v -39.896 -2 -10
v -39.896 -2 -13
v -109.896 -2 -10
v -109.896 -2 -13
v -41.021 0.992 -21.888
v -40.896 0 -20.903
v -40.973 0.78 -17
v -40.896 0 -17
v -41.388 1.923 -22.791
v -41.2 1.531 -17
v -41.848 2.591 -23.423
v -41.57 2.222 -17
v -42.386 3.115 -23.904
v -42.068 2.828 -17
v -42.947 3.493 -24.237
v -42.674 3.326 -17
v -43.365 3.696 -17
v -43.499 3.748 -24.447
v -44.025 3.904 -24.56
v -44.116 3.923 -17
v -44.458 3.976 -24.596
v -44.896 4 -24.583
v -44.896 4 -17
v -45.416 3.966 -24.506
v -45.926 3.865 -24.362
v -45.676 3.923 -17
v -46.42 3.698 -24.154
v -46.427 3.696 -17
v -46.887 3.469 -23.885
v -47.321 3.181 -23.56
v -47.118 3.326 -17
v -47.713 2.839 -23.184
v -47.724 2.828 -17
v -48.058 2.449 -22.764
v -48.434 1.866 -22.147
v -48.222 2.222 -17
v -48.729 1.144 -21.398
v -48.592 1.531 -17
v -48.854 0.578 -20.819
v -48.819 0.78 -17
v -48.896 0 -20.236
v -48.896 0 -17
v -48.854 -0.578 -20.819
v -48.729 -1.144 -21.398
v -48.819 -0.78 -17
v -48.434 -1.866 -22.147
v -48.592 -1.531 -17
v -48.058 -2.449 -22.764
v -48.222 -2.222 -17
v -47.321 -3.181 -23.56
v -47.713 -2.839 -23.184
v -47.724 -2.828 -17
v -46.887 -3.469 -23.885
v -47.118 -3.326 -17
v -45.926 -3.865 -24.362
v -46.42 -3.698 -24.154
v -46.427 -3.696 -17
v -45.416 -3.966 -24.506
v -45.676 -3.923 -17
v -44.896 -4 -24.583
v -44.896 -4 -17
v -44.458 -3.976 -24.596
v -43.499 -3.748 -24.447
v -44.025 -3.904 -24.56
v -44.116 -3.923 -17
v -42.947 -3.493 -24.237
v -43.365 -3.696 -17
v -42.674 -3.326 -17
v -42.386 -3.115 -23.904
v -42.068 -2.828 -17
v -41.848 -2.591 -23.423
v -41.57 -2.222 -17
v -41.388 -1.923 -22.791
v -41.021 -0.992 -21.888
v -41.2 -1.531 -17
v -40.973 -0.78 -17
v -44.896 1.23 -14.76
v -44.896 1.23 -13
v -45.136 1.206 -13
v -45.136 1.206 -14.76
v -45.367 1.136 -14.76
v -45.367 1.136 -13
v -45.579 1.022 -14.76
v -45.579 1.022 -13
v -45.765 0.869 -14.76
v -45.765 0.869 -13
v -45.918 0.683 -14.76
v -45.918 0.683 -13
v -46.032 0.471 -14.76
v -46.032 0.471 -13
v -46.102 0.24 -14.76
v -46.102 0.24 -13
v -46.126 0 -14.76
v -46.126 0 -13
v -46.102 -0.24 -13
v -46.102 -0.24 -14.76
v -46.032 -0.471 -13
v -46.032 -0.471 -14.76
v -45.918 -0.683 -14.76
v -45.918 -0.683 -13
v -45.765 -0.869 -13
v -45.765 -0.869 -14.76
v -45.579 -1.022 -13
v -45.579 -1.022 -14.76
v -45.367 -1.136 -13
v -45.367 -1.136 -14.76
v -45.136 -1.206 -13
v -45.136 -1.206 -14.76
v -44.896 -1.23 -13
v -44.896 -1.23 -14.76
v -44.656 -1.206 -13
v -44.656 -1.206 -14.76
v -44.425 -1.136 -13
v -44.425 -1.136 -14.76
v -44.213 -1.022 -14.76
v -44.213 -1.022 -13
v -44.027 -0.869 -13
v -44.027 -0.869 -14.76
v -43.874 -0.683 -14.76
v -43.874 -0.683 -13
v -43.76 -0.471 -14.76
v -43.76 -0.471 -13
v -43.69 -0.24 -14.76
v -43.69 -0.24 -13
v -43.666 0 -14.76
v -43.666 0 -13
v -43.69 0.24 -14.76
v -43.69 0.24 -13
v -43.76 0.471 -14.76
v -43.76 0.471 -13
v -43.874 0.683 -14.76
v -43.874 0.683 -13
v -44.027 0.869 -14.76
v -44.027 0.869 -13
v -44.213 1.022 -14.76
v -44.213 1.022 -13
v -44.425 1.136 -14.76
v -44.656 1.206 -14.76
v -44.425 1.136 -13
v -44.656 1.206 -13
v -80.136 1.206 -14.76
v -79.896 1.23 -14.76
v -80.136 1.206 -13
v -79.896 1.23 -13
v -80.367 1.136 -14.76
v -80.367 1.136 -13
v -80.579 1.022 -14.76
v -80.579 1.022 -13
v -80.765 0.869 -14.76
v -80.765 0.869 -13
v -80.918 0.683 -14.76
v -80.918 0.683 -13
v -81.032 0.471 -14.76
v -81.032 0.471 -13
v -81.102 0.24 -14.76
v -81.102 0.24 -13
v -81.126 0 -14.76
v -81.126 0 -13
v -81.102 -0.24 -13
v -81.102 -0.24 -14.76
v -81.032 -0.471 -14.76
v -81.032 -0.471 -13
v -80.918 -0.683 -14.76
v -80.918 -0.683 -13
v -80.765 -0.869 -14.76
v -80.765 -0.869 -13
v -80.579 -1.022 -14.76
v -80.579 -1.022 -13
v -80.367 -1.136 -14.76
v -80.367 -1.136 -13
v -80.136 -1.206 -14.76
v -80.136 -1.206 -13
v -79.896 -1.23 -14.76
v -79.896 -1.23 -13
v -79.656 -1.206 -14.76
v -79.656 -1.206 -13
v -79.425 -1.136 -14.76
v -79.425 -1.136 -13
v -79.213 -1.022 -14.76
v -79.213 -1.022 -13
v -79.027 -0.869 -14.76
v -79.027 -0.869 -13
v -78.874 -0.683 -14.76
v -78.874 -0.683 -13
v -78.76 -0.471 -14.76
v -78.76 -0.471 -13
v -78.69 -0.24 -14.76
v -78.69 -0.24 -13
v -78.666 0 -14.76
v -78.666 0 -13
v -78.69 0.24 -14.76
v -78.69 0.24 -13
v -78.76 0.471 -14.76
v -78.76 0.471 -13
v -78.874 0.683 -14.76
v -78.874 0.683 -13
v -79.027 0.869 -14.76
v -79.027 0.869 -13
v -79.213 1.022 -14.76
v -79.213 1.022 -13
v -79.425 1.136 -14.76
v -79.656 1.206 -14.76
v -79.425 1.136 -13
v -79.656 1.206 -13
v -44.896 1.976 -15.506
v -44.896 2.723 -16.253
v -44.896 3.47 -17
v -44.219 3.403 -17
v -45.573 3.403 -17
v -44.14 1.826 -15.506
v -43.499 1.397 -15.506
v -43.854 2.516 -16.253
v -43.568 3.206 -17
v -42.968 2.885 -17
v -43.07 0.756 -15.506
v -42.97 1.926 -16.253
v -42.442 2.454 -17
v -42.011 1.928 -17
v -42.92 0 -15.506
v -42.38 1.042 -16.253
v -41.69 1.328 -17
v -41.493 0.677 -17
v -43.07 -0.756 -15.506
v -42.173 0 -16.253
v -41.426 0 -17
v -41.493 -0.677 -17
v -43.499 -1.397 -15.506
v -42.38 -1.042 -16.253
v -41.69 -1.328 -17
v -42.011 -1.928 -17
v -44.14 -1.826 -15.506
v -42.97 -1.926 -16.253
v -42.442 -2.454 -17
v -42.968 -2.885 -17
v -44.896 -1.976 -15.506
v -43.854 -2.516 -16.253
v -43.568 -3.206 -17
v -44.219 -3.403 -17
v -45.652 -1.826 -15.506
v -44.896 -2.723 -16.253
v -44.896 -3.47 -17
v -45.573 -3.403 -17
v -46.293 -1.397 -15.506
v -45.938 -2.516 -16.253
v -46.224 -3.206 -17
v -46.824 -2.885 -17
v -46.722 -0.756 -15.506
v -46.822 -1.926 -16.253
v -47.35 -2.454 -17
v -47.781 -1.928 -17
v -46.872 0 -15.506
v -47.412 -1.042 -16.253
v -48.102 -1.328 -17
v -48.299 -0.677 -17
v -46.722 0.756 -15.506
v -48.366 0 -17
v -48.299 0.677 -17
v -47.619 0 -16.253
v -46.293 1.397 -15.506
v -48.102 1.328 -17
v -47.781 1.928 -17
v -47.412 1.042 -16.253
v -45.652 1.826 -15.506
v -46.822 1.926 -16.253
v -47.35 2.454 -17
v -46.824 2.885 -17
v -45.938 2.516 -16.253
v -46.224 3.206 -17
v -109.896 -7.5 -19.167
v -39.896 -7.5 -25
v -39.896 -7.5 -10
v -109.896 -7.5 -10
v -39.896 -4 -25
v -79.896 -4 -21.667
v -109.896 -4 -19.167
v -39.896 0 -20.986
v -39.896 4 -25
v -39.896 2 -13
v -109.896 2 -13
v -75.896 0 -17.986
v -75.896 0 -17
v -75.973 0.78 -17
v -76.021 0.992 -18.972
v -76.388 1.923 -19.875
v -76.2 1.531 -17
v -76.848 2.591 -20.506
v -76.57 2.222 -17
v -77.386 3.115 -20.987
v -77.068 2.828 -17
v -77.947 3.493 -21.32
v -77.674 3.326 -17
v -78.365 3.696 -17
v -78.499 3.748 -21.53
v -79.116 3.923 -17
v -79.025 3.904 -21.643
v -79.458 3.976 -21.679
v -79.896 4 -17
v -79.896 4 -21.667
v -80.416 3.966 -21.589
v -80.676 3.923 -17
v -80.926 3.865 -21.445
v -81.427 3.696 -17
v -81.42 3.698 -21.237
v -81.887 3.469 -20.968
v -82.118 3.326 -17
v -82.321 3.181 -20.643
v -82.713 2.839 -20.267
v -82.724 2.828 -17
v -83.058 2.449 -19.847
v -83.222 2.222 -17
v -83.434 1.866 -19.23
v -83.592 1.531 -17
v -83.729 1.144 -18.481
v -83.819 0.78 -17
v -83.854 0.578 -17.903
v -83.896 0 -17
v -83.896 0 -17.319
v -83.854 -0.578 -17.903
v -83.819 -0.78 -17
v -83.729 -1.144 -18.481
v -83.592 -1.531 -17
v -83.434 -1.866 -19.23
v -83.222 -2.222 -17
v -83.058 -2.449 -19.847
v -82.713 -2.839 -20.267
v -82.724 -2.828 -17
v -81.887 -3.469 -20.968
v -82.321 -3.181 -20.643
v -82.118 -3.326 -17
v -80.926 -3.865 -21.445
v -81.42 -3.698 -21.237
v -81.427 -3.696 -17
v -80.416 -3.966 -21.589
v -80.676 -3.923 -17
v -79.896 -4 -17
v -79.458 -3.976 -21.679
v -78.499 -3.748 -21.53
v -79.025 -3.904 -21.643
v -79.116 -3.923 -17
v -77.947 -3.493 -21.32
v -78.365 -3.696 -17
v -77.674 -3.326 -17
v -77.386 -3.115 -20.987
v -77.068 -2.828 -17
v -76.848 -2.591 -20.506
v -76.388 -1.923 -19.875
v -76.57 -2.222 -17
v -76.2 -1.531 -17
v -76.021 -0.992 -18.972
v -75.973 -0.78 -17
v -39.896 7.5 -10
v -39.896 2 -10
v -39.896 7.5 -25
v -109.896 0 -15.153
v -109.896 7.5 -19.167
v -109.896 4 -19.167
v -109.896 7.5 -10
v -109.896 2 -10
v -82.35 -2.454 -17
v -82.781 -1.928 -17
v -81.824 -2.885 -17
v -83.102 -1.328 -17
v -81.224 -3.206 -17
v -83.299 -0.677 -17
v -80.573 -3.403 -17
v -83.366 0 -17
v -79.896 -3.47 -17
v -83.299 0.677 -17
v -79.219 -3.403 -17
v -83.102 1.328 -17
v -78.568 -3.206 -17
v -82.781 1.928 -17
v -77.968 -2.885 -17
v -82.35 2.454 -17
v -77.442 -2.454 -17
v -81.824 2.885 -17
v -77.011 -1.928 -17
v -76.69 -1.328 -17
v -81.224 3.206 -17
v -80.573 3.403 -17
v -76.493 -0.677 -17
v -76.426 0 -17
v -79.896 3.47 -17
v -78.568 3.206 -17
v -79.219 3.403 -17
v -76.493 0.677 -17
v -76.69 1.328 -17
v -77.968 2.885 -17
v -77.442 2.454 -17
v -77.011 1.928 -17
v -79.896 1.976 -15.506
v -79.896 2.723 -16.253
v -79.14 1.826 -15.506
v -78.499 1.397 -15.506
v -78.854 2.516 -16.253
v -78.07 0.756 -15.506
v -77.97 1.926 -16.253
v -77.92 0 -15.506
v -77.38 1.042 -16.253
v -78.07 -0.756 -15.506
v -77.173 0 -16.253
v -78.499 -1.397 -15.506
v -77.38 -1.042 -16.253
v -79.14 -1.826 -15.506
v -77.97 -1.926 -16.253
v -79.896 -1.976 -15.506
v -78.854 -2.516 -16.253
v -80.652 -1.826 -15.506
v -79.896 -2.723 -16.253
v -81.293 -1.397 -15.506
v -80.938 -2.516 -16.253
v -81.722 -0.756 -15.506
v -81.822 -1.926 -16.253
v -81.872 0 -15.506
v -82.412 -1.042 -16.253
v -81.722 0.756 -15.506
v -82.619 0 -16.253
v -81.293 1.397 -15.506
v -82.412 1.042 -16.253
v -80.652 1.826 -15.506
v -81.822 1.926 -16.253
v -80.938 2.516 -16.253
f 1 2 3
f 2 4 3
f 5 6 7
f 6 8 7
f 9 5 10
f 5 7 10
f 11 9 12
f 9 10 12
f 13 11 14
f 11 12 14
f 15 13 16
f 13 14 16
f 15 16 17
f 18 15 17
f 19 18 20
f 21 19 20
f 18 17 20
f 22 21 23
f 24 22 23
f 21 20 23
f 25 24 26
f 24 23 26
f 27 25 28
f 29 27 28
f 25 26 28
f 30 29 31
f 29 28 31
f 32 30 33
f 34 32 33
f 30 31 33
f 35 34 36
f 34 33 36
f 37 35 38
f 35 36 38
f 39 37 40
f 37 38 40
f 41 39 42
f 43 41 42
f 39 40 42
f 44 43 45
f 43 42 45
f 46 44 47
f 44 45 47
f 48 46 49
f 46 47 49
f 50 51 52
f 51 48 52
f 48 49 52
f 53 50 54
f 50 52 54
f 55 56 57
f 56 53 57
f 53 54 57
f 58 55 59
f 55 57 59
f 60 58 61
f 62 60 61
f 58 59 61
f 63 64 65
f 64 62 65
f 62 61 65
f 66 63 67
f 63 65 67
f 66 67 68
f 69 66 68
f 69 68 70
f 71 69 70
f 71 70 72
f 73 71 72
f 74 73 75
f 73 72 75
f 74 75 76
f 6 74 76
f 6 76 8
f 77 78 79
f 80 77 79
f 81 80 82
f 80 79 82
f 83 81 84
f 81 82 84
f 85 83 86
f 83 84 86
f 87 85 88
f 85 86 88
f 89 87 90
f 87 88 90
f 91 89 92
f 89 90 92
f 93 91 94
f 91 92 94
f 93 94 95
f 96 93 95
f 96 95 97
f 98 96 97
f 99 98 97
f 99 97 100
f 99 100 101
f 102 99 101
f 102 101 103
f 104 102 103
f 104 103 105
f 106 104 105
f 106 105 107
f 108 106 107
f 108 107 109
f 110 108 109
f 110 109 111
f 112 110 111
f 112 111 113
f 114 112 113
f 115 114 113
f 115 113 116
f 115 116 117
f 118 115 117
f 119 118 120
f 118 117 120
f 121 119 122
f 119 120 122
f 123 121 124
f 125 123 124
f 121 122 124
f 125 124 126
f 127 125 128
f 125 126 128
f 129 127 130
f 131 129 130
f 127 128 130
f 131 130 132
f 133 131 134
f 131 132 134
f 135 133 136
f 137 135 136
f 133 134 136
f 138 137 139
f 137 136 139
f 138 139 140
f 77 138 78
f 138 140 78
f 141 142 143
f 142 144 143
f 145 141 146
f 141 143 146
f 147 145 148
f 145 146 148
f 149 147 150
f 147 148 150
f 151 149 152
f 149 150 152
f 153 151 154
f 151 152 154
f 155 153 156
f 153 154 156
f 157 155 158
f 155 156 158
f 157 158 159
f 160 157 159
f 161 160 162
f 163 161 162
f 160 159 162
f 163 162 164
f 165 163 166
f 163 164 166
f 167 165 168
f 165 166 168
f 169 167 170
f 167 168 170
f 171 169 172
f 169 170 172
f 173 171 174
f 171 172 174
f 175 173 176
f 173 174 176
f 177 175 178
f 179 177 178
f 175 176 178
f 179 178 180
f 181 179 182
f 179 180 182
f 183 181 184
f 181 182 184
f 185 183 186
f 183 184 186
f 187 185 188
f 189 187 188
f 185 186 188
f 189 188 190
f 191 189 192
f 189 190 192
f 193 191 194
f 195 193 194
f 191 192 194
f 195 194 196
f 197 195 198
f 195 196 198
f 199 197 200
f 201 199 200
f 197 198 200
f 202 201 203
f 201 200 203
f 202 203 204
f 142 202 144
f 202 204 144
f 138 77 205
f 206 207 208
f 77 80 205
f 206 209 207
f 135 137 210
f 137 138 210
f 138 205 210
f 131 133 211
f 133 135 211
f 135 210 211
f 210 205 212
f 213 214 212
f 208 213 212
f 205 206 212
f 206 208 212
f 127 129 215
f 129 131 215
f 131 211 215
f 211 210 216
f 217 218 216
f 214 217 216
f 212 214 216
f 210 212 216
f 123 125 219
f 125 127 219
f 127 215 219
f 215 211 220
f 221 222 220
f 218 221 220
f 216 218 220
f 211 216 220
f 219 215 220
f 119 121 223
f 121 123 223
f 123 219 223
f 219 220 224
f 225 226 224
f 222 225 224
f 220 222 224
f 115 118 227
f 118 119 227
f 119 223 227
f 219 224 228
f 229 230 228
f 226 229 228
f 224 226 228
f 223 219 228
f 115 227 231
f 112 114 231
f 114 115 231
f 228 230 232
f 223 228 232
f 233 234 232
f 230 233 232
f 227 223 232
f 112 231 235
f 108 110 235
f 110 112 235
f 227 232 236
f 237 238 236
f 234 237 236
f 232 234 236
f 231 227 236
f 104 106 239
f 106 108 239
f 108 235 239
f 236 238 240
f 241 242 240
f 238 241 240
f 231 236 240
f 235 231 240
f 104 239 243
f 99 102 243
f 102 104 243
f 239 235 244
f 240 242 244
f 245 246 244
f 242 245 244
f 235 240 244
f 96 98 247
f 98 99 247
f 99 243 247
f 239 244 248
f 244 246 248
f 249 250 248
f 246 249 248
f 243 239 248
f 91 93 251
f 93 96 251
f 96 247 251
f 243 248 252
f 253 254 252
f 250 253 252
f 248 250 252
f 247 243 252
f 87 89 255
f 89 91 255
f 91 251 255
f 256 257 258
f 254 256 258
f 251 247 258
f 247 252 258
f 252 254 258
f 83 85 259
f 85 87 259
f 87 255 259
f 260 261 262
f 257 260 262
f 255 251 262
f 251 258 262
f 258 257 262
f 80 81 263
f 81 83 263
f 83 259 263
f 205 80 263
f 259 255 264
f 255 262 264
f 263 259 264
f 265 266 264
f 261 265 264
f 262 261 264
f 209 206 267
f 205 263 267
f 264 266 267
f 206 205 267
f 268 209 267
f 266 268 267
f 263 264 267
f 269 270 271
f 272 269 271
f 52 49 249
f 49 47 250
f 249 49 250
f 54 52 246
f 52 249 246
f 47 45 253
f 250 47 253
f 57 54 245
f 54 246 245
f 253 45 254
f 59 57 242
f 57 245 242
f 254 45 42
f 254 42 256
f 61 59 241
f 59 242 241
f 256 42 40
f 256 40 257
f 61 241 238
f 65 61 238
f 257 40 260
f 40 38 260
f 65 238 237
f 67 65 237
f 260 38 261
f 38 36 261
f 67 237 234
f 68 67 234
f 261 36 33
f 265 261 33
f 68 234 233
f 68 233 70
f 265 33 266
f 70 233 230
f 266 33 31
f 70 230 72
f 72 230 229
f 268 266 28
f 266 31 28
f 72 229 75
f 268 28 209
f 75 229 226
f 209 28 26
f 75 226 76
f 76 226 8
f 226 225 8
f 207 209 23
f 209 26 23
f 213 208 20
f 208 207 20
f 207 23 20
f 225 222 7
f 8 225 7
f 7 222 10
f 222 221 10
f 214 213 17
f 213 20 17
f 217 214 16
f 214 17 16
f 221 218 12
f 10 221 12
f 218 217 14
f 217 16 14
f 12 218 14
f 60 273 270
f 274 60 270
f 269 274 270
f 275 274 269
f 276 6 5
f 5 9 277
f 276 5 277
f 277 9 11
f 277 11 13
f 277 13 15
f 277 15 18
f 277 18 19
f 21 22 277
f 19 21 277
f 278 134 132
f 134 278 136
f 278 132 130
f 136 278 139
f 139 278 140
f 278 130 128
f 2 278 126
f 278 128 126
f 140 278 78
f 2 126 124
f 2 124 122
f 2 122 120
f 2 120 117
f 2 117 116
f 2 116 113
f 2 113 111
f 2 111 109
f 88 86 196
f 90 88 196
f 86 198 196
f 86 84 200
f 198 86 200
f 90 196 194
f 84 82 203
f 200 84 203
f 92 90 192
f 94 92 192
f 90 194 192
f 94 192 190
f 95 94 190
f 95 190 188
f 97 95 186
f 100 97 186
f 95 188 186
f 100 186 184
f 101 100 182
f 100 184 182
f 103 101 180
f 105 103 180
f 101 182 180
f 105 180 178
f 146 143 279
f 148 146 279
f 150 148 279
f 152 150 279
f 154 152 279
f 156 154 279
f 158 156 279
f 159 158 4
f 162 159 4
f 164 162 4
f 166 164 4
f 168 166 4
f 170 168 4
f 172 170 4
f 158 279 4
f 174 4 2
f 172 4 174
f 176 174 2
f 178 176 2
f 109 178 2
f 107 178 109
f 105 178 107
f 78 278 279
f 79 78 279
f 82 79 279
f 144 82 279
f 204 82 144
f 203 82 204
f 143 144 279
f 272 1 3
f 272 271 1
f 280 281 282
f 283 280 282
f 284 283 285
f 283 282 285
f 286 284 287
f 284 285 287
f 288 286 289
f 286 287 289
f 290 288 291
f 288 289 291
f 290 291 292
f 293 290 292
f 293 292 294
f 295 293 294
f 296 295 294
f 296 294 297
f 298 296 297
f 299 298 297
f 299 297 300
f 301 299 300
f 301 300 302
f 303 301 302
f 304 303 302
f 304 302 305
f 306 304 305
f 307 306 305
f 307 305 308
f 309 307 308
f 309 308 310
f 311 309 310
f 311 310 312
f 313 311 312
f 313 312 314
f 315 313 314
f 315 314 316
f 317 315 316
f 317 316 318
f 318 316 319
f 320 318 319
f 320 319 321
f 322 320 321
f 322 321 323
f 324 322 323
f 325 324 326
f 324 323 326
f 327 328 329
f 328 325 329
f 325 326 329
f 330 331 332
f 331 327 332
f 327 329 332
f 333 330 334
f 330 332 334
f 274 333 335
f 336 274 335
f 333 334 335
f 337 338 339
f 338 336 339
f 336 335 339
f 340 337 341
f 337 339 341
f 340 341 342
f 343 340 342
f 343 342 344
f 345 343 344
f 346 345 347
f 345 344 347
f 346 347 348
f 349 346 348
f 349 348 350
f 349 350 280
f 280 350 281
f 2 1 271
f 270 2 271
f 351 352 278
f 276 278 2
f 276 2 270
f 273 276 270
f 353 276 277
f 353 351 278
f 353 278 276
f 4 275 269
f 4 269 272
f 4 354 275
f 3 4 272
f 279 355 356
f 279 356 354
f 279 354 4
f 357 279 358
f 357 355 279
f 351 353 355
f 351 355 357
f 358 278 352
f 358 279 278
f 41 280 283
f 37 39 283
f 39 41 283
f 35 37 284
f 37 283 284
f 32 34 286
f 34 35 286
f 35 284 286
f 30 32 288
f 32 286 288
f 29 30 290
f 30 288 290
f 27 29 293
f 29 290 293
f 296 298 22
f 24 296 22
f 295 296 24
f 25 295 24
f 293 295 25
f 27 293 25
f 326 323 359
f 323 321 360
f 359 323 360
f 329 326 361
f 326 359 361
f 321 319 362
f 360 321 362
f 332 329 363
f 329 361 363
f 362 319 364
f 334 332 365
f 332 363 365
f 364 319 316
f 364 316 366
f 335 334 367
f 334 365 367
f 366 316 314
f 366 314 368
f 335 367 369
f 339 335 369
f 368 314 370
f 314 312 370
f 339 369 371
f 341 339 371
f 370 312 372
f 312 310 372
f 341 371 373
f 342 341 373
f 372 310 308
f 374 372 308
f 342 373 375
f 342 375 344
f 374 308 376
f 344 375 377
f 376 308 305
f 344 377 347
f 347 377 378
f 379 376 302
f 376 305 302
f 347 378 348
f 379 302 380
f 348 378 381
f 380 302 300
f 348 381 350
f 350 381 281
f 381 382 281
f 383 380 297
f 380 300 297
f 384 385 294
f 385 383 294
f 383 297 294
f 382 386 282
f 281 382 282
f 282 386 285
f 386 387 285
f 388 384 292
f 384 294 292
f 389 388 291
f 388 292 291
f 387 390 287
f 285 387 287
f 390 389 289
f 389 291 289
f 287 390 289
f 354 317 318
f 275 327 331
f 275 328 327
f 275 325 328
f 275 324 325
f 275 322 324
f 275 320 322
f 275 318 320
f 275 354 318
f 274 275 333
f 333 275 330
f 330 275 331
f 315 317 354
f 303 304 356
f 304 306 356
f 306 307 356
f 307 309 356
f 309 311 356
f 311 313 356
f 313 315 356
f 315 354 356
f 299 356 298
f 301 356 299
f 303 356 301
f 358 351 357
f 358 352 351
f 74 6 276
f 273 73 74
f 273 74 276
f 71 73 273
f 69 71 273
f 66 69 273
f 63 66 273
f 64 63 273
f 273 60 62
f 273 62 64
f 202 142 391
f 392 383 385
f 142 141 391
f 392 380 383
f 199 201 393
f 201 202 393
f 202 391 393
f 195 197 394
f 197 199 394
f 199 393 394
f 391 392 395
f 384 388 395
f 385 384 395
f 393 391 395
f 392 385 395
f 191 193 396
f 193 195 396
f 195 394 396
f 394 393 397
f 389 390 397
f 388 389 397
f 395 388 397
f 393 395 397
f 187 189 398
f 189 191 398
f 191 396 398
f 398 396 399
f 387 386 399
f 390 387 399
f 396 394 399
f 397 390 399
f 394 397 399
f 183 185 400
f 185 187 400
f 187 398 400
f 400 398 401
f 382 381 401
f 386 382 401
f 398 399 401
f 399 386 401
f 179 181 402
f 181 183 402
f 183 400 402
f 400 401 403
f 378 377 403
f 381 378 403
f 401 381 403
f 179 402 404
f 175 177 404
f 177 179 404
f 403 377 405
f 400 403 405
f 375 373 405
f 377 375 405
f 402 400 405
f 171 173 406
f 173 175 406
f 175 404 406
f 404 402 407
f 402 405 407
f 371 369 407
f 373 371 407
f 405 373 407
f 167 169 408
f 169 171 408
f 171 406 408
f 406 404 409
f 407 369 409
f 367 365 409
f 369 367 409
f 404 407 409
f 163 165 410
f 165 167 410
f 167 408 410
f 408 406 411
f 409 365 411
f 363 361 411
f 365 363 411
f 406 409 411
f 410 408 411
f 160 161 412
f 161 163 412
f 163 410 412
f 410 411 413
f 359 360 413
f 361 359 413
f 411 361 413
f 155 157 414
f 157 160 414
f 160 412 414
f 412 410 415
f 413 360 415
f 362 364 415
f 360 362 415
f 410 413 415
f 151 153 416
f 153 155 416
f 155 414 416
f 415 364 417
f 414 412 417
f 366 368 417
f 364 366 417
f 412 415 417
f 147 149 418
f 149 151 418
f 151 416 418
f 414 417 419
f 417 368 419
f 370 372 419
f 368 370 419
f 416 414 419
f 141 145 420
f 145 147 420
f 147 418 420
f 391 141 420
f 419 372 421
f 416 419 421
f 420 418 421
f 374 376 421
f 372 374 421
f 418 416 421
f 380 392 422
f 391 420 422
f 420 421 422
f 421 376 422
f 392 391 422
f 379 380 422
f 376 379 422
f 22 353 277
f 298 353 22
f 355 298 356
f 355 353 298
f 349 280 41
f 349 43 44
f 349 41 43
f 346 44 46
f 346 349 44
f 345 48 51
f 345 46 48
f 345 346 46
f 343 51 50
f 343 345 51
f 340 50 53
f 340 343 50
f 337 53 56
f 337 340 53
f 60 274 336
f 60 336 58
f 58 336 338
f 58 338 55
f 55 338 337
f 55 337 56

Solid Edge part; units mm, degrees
sketch "Sketch1" plane through (0, 0, 0) normal (0, -1, 0) x (1, 0, 0)
  line L0 (-109.896, -8.7564) -> (-39.896, 10)
  line L1 (-39.896, 10) -> (30.104, 10)
  arc A0 (30.104, 10) -> (30.104, -10) centre (30.104, 0) cw
  line L2 (30.104, -10) -> (-39.896, -10)
  line L3 (-39.896, -10) -> (-39.896, -18.7564)
  line L4 (-39.896, -18.7564) -> (-109.896, -18.7564)
  line L5 (-109.896, -18.7564) -> (-109.896, -8.7564)
  circle A1 centre (30.104, 0) radius 5
  circle A2 centre (0, 0) radius 5
  dimension "D1" = 10
  dimension "D2" = 30.104
  dimension "D3" = 10
  dimension "D4" = 70
  dimension "D5" = 8.7564
  dimension "D6" = 10
  dimension "D7" = 70
extrude "Protrusion1" add sketch "Sketch1" along normal mid plane 4
sketch "Sketch2" plane through (-34.896, 0, -4.3782) normal (0, -1, 0) x (1, 0, 0)
  line L0 (-5, 14.3782) -> (-5, -20.6218)
  line L1 (-5, -20.6218) -> (-75, -14.7884)
  line L2 (-75, -4.3782) -> (-75, -14.7884)
  line L3 (-75, -4.3782) -> (-5, 14.3782)
  dimension "D1" = 35
extrude "Protrusion2" add sketch "Sketch2" along normal mid plane 15
sketch "Sketch3" plane through (-74.896, -7.5, -22.0833) normal (0.9965458, 0, -0.0830455) x (0, 1, 0)
  line L0 (7.5, 4) -> (3.5, 0)
  line L1 (3.5, 0) -> (11.5, 0)
  line L2 (7.5, 4) -> (11.5, 0)
  dimension "D1" = 4
extrude "Cutout1" cut sketch "Sketch3" along normal through all and the other way through all
sketch "Sketch4" plane through (-74.896, -7.5, -7.5) normal (0, -1, 0) x (0, 0, -1)
  line L0 (2.5, 128.4627) -> (2.5, -36.5848)
  line L1 (2.5, -36.5848) -> (-39.0806, -36.5848)
  line L2 (-39.0806, 128.4627) -> (-39.0806, -36.5848)
  line L3 (2.5, 128.4627) -> (-39.0806, 128.4627)
extrude "Cutout2" cut sketch "Sketch4" against normal up to next
sketch "Sketch5" plane through (-109.896, 0, -14.5833) normal (-1, 0, 0) x (0, 0, 1)
  line L0 (4.5833, -2) -> (4.5833, 2)
  line L1 (1.5833, 2) -> (4.5833, 2)
  line L2 (1.5833, 2) -> (1.5833, -2)
  line L3 (1.5833, -2) -> (4.5833, -2)
  dimension "D1" = 4
  dimension "D2" = 3
extrude "Cutout3" cut sketch "Sketch5" against normal up to next
sketch "Sketch6" plane through (-74.896, 0, -17) normal (0, 0, 1) x (1, 0, 0)
  circle A0 centre (30, 0) radius 4
  circle A1 centre (-5, 0) radius 4
  dimension "D1" = 8
  dimension "D2" = 35
  dimension "D3" = 5
  dimension "D4" = 8
extrude "VaciadoExtruido_6" cut sketch "Sketch6" against normal up to next
hole "Agujero_7" at (-79.896, 0, -17) direction (0, 0, 1) diameter 2.459 depth 7 tip angle 90 countersink diameter 6.94 countersink angle 90 thread major 3 thread length 5
hole "Hole1" at (-44.896, 0, -17) direction (0, 0, 1) diameter 2.459 depth 7 tip angle 90 countersink diameter 6.94 countersink angle 90 thread major 3 thread length 5
properties part number "1976-1500-006" material "Aluminio, 7075-T6"
